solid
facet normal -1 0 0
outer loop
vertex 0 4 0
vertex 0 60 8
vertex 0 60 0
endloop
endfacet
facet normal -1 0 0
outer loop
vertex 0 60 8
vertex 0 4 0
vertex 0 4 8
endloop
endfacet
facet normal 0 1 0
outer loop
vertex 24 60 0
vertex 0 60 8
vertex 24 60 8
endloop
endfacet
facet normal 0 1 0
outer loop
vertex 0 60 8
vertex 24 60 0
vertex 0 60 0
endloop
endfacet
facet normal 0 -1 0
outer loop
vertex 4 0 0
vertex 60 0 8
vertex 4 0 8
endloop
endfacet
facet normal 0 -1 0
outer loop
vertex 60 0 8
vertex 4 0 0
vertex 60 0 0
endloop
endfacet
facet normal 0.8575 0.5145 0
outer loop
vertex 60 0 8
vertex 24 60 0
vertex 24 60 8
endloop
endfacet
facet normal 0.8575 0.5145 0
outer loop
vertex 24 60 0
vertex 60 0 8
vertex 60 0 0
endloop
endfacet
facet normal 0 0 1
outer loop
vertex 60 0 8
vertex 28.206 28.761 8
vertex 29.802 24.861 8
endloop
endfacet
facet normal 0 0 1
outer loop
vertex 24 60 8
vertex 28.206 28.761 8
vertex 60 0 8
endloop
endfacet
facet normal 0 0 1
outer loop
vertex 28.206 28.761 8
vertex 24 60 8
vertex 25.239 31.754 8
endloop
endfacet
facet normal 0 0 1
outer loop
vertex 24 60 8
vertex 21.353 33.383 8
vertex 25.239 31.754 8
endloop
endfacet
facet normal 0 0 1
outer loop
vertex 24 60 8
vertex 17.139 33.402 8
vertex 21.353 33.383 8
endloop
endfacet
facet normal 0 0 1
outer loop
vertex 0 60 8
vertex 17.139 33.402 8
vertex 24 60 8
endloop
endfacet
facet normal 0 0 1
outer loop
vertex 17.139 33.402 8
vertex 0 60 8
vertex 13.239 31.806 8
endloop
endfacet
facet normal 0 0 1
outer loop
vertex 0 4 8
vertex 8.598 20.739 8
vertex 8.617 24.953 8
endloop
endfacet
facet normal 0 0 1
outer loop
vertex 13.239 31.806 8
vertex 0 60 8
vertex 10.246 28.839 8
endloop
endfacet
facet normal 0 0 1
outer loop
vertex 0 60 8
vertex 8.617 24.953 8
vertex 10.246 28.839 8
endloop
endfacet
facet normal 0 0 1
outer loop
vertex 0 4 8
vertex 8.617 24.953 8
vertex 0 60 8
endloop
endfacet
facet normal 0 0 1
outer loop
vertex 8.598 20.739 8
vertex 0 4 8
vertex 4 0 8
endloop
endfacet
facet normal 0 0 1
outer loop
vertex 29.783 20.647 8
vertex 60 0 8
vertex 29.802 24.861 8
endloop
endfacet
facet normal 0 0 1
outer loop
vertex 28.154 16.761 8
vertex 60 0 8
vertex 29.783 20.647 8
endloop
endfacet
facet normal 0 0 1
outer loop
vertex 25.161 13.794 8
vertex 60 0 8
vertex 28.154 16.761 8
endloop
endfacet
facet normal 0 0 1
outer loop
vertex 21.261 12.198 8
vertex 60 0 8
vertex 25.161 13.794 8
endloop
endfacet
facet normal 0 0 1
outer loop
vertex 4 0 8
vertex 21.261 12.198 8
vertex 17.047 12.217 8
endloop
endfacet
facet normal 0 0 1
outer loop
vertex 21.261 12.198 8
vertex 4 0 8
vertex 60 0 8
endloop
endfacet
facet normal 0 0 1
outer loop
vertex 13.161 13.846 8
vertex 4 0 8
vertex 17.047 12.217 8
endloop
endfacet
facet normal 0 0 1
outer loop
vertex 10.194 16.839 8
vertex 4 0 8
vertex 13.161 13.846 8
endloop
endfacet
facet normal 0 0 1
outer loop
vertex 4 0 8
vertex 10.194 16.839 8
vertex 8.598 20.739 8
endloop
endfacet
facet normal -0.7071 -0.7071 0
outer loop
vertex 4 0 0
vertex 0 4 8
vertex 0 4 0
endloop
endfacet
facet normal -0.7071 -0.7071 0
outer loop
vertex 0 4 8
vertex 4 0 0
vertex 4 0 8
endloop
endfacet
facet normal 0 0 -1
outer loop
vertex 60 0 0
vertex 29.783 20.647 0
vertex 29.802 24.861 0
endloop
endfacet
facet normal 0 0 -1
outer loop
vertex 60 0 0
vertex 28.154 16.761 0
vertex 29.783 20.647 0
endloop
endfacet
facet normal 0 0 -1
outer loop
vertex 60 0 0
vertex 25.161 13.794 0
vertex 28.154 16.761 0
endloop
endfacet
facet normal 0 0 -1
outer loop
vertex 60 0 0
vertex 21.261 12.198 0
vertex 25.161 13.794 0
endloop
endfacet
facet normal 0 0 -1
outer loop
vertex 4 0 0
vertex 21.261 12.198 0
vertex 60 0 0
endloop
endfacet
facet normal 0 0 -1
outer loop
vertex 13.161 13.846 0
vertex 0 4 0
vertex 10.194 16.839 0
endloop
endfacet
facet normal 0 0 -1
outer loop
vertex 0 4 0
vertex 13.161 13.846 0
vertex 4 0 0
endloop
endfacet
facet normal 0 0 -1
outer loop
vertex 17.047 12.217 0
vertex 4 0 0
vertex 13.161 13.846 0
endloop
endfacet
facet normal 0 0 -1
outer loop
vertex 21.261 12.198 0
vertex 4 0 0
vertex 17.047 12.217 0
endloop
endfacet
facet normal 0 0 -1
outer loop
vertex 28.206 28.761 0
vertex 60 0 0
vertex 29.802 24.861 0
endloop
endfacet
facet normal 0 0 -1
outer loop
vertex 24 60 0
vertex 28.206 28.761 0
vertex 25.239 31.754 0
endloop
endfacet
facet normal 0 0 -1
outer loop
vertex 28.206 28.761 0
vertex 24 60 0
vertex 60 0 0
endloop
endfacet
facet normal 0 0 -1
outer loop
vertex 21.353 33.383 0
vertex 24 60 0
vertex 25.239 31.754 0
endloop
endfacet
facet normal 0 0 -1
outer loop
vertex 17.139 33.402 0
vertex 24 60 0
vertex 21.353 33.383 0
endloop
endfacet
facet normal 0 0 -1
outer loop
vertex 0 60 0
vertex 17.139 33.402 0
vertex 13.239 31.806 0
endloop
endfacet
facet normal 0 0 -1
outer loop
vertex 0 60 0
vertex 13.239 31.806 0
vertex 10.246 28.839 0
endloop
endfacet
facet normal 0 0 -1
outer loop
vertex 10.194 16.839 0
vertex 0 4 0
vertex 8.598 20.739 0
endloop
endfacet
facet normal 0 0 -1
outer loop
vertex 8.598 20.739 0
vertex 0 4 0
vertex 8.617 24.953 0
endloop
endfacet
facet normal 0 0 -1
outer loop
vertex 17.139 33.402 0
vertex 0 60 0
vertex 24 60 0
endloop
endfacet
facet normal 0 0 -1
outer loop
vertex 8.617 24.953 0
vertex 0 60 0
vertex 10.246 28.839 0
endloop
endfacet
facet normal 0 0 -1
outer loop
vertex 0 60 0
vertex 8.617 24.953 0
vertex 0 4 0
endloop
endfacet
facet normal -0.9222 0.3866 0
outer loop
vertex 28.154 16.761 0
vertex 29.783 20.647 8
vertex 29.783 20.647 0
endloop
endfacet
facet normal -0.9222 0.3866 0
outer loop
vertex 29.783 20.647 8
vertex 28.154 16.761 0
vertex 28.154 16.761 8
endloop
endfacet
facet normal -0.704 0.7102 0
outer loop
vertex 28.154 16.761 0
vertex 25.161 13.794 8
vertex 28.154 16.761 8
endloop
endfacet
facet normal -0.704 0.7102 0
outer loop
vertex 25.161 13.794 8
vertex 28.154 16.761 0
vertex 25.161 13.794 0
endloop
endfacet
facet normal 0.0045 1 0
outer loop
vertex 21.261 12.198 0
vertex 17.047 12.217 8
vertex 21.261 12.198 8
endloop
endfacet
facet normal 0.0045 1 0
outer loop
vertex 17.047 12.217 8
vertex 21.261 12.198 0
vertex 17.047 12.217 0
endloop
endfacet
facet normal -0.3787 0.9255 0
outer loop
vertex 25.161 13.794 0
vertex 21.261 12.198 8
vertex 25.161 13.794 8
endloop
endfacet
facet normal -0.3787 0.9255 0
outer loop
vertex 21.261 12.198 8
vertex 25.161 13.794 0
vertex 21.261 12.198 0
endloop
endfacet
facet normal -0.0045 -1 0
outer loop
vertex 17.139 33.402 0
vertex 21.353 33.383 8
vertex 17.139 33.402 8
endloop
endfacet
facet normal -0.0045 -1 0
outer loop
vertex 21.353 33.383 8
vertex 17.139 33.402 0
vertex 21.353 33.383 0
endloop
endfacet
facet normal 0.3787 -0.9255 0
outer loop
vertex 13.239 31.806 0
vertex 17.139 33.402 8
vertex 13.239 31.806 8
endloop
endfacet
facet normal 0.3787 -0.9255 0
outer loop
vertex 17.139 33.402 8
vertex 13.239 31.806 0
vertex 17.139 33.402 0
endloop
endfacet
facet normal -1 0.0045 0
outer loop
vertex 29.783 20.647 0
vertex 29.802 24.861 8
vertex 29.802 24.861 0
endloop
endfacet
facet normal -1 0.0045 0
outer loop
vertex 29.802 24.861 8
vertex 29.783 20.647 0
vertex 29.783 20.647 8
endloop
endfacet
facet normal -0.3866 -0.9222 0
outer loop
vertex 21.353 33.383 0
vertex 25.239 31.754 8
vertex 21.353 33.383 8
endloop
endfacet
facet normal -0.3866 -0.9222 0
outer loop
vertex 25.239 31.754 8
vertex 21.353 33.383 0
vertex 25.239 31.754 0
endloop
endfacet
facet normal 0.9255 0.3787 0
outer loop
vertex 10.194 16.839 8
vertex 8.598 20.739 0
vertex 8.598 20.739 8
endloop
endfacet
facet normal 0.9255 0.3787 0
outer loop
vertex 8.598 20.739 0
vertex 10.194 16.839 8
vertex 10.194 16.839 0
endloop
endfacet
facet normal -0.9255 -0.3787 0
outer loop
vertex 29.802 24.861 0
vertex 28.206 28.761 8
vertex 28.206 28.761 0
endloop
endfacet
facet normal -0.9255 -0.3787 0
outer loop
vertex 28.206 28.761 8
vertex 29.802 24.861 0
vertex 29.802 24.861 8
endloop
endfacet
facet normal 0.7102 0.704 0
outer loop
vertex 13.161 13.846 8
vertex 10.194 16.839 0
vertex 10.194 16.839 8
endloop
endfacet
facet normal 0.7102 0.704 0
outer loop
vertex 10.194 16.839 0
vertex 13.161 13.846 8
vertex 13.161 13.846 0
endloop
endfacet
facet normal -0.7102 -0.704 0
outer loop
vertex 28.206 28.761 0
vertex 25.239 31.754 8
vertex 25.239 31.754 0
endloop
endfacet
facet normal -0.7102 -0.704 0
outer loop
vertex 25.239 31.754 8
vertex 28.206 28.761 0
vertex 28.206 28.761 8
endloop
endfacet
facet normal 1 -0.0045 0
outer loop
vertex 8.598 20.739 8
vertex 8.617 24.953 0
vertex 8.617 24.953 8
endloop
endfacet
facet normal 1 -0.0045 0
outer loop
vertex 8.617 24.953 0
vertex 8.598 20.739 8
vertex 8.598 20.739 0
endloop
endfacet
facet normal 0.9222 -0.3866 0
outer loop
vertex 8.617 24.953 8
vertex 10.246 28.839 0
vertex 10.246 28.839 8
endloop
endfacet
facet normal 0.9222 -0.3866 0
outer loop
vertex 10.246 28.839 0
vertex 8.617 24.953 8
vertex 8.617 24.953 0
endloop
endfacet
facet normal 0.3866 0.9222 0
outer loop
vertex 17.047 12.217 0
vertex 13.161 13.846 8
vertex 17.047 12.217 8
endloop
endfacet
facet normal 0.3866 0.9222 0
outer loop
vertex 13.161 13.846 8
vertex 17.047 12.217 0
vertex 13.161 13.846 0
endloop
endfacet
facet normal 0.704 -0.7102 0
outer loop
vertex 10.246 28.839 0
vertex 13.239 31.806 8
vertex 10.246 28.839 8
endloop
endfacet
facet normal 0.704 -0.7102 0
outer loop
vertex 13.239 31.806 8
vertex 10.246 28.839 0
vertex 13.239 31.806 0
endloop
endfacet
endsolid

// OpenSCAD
$fn = 32;

// ----------------------------------------------------------------------
// Bracket plate: gusset 60 x 60
// ----------------------------------------------------------------------

// --- parameters (mm) ---
hole_r = 3.5;             // bolt hole radius
plate_t = 8;              // plate thickness, Z (extrusion height)
gus_a = 60;               // base length
gus_b = 60;               // height
top_x = 24;               // top edge X of the angled cut
light_r = 10.8;           // lightening hole radius

light_d = 2 * light_r;

profile = [[4, 0], [30, 0], [60, 0], [24, 60], [0, 60], [0, 4]];  // primary outline, 6 points, counter clockwise
void_1 = [[29.802, 24.861], [28.206, 28.761], [25.239, 31.754], [21.353, 33.383], [17.139, 33.402], [13.239, 31.806], [10.246, 28.839], [8.617, 24.953], [8.598, 20.739], [10.194, 16.839], [13.161, 13.846], [17.047, 12.217], [21.261, 12.198], [25.161, 13.794], [28.154, 16.761], [29.783, 20.647]];  // lightening hole, 16 points

// --- the one profile operation ---
difference() {
  linear_extrude(height = plate_t) polygon(points = profile);
  translate([0, 0, -1])
    linear_extrude(height = plate_t + 2) polygon(points = void_1);
}
